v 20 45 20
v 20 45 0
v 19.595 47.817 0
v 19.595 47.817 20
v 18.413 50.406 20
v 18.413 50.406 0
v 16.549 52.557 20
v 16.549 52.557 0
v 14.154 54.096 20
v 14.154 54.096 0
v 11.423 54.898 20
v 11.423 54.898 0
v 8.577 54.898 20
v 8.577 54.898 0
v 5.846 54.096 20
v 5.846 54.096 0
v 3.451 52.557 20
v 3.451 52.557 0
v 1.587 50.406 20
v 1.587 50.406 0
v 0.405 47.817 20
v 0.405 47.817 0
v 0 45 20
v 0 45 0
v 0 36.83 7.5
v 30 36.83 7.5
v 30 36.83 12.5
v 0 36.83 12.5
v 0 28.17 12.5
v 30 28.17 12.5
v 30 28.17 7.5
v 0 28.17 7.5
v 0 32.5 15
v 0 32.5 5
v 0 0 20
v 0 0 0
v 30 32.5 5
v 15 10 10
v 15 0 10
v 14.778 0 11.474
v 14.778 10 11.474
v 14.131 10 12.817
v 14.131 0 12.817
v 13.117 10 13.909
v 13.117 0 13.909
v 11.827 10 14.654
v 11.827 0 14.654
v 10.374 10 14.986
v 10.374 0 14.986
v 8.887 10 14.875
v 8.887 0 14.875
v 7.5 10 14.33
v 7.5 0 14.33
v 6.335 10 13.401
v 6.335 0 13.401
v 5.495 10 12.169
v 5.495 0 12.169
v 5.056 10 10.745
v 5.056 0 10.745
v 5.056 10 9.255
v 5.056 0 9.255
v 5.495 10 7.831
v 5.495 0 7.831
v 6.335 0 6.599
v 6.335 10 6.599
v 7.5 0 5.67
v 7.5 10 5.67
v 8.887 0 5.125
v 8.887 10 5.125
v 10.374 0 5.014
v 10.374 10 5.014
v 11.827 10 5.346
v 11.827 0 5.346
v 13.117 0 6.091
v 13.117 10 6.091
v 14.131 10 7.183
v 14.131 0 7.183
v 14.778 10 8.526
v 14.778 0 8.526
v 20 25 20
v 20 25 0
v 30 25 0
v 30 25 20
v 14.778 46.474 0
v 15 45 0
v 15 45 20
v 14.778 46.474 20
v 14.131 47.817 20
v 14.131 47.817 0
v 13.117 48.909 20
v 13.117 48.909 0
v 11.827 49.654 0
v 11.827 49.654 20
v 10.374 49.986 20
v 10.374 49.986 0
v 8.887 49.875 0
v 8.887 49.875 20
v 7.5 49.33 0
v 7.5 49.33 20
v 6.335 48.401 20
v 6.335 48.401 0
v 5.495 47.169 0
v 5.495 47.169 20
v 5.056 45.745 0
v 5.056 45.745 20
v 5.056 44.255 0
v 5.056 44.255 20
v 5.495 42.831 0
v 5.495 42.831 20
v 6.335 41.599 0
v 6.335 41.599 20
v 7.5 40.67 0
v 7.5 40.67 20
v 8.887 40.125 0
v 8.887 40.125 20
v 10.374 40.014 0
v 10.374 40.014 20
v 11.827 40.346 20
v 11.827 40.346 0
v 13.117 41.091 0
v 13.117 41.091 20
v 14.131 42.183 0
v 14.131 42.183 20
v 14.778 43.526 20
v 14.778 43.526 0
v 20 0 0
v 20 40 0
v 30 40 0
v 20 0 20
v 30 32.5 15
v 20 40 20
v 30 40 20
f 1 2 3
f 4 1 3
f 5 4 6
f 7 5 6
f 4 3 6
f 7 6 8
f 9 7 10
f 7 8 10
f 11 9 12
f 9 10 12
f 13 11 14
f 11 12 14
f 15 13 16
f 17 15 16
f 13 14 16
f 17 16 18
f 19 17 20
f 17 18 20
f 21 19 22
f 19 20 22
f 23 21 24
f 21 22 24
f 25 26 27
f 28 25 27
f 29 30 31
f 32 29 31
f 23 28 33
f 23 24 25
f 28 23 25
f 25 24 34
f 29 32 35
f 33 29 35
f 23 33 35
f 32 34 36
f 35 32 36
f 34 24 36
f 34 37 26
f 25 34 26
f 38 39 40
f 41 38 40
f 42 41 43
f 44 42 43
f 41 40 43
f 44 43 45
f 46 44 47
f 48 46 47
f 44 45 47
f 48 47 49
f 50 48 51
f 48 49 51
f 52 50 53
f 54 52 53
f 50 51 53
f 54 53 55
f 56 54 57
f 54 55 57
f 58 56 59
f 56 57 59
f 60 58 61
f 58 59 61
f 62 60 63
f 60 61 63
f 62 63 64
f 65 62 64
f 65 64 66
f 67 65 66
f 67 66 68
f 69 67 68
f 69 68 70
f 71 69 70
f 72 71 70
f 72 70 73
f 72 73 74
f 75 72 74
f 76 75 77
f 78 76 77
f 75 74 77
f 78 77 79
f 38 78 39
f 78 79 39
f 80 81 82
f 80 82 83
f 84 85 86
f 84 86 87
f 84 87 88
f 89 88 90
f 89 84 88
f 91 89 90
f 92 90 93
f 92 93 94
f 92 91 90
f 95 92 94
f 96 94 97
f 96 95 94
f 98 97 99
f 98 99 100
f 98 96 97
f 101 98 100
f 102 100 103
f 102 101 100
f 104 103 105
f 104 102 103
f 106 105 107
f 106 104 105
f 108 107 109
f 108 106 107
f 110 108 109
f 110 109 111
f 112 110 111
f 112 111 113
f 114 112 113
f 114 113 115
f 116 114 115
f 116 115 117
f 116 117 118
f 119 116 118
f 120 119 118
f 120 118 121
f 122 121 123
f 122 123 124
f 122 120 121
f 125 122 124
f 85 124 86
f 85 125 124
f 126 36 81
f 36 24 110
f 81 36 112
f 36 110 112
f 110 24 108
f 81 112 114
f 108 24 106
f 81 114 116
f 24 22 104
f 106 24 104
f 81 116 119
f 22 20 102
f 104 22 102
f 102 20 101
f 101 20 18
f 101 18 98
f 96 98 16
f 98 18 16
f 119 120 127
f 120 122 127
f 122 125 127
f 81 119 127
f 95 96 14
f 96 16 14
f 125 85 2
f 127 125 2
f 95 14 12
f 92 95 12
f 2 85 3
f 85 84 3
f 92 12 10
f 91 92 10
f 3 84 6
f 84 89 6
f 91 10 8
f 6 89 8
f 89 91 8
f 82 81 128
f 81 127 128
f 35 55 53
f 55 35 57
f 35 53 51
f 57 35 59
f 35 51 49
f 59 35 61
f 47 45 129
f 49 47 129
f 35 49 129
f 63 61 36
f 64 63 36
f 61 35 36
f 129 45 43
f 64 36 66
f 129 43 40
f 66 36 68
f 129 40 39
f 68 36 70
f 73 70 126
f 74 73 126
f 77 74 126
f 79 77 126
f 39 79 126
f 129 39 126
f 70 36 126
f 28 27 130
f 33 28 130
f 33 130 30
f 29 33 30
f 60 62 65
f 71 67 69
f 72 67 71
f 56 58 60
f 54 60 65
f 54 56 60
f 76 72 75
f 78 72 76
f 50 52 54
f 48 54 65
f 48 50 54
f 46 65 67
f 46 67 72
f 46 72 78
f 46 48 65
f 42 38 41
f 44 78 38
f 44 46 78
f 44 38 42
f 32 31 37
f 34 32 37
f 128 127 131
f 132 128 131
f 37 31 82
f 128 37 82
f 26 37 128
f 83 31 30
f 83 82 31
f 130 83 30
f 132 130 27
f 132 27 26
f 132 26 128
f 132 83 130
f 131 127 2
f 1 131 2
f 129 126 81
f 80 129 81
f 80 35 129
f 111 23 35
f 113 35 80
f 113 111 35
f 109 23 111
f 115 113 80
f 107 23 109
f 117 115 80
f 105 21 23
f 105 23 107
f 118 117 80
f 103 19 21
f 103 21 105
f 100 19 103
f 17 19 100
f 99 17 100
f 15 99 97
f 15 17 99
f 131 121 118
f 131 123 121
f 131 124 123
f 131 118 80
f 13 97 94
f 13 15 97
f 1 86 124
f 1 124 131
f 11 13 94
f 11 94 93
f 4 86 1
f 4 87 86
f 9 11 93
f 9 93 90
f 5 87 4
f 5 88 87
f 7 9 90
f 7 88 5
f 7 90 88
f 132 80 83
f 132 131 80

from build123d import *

# Parameters (mm, degrees)
F0_R     = 5
F1_DEPTH = 20
F2_R     = 5
F3_DEPTH = 10
F4_W     = 15
F4_H     = 20
F5_DEPTH = 10
F7_DEPTH = 30


with BuildPart() as f1:
    # F0 (on Top) → F1 (new body)
    with BuildSketch(Plane.XY):
        with BuildLine():
            Line((0, 45), (0, 0))
            Line((0, 0), (20, 0))
            Line((20, 0), (20, 45))
            ThreePointArc((20, 45), (10, 55), (0, 45))
        make_face()
        with Locations((10, 45)):
            Circle(F0_R, mode=Mode.SUBTRACT)
    extrude(amount=F1_DEPTH)

    # F2 (on face) → F3 (cut)
    with BuildSketch(Plane.XZ):
        with Locations((10, 10)):
            Circle(F2_R)
    extrude(amount=-F3_DEPTH, mode=Mode.SUBTRACT)

    # F4 (on face) → F5 (join)
    with BuildSketch(Plane.YZ.offset(20)):
        with Locations((32.5, 10)):
            Rectangle(F4_W, F4_H)
    extrude(amount=F5_DEPTH)

    # F6 (on face) → F7 (cut, through all)
    with BuildSketch(Plane.YZ.offset(30)):
        Polygon((36.830127, 12.5), (32.5, 15), (28.169873, 12.5), (28.169873, 7.5), (32.5, 5), (36.830127, 7.5), align=None)
    extrude(amount=-F7_DEPTH, mode=Mode.SUBTRACT)


solid = f1.part
